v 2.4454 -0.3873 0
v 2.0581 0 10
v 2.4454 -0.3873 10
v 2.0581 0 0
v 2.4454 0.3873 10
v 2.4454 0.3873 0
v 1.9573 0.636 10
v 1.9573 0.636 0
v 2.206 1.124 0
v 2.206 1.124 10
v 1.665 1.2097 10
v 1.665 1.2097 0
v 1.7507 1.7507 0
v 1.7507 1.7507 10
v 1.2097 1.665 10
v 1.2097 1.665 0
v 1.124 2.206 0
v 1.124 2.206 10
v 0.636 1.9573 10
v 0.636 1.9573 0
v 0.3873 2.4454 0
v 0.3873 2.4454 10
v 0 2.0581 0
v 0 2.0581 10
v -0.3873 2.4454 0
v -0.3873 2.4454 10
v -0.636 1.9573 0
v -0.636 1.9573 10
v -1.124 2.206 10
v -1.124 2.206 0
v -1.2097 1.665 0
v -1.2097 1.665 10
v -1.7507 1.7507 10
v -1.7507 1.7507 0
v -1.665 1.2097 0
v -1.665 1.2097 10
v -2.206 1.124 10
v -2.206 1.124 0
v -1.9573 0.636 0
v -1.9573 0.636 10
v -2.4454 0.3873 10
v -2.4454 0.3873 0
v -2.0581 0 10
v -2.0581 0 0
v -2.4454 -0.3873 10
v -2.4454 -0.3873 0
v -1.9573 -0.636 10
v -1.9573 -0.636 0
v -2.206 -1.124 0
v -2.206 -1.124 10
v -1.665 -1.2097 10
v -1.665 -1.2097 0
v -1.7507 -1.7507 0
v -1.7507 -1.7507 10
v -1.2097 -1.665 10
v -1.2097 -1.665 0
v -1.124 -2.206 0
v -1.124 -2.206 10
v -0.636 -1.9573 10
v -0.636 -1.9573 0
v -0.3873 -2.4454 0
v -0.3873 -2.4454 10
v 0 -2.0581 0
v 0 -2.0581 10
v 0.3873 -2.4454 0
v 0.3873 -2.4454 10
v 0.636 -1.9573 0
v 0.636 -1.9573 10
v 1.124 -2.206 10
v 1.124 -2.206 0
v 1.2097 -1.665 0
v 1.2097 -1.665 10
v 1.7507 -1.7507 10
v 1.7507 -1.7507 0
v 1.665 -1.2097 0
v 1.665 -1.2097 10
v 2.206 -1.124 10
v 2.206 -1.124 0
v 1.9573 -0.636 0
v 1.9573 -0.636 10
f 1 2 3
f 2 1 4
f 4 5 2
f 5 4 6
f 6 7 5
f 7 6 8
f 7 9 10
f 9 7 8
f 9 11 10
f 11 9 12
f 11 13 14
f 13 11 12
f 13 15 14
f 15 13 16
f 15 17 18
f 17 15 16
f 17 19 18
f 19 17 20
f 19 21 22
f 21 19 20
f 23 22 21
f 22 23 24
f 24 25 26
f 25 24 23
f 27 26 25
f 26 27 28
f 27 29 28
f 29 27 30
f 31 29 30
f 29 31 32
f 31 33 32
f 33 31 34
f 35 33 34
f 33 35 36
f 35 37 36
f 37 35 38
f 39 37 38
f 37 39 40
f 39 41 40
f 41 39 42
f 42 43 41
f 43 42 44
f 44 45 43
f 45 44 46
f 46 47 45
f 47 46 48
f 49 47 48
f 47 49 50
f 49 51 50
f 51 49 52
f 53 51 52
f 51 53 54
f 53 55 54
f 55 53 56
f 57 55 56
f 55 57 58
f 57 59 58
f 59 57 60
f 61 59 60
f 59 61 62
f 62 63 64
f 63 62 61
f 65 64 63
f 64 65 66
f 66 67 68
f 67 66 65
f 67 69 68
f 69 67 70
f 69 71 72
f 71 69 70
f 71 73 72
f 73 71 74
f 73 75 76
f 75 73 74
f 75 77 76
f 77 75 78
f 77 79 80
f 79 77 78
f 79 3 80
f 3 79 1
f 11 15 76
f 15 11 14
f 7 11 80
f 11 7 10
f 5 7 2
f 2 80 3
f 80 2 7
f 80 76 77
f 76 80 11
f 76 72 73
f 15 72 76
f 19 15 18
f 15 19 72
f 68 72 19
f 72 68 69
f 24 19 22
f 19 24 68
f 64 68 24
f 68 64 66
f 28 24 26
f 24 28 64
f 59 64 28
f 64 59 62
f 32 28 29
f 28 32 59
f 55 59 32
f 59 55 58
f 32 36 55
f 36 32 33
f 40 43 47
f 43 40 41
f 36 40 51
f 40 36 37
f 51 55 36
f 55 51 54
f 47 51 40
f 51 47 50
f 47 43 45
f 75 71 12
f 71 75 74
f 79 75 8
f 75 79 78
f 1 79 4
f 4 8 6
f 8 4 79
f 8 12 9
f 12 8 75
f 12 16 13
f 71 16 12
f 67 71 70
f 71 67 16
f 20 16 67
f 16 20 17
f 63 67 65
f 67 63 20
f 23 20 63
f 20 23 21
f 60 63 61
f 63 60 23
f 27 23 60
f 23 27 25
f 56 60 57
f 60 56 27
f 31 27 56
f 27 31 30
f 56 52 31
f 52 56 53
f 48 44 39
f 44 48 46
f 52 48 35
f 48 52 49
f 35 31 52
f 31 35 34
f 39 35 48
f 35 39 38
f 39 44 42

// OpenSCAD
$fn=100;

module gear_shaft(_r, _h, _teeth=0) {

    difference() {
        cylinder(r=_r, h=_h);

        if (_teeth > 0) {
            for (_angle = [0 : 360 / _teeth : 359]) {
                translate([_r * cos(_angle), _r * sin(_angle), _h/2])
                rotate([0, 0, _angle + 45])
                cube([_r/4, _r/4, _h+2], true);
            }
        }
    }

}

gear_shaft(2.5, 10, 20);
